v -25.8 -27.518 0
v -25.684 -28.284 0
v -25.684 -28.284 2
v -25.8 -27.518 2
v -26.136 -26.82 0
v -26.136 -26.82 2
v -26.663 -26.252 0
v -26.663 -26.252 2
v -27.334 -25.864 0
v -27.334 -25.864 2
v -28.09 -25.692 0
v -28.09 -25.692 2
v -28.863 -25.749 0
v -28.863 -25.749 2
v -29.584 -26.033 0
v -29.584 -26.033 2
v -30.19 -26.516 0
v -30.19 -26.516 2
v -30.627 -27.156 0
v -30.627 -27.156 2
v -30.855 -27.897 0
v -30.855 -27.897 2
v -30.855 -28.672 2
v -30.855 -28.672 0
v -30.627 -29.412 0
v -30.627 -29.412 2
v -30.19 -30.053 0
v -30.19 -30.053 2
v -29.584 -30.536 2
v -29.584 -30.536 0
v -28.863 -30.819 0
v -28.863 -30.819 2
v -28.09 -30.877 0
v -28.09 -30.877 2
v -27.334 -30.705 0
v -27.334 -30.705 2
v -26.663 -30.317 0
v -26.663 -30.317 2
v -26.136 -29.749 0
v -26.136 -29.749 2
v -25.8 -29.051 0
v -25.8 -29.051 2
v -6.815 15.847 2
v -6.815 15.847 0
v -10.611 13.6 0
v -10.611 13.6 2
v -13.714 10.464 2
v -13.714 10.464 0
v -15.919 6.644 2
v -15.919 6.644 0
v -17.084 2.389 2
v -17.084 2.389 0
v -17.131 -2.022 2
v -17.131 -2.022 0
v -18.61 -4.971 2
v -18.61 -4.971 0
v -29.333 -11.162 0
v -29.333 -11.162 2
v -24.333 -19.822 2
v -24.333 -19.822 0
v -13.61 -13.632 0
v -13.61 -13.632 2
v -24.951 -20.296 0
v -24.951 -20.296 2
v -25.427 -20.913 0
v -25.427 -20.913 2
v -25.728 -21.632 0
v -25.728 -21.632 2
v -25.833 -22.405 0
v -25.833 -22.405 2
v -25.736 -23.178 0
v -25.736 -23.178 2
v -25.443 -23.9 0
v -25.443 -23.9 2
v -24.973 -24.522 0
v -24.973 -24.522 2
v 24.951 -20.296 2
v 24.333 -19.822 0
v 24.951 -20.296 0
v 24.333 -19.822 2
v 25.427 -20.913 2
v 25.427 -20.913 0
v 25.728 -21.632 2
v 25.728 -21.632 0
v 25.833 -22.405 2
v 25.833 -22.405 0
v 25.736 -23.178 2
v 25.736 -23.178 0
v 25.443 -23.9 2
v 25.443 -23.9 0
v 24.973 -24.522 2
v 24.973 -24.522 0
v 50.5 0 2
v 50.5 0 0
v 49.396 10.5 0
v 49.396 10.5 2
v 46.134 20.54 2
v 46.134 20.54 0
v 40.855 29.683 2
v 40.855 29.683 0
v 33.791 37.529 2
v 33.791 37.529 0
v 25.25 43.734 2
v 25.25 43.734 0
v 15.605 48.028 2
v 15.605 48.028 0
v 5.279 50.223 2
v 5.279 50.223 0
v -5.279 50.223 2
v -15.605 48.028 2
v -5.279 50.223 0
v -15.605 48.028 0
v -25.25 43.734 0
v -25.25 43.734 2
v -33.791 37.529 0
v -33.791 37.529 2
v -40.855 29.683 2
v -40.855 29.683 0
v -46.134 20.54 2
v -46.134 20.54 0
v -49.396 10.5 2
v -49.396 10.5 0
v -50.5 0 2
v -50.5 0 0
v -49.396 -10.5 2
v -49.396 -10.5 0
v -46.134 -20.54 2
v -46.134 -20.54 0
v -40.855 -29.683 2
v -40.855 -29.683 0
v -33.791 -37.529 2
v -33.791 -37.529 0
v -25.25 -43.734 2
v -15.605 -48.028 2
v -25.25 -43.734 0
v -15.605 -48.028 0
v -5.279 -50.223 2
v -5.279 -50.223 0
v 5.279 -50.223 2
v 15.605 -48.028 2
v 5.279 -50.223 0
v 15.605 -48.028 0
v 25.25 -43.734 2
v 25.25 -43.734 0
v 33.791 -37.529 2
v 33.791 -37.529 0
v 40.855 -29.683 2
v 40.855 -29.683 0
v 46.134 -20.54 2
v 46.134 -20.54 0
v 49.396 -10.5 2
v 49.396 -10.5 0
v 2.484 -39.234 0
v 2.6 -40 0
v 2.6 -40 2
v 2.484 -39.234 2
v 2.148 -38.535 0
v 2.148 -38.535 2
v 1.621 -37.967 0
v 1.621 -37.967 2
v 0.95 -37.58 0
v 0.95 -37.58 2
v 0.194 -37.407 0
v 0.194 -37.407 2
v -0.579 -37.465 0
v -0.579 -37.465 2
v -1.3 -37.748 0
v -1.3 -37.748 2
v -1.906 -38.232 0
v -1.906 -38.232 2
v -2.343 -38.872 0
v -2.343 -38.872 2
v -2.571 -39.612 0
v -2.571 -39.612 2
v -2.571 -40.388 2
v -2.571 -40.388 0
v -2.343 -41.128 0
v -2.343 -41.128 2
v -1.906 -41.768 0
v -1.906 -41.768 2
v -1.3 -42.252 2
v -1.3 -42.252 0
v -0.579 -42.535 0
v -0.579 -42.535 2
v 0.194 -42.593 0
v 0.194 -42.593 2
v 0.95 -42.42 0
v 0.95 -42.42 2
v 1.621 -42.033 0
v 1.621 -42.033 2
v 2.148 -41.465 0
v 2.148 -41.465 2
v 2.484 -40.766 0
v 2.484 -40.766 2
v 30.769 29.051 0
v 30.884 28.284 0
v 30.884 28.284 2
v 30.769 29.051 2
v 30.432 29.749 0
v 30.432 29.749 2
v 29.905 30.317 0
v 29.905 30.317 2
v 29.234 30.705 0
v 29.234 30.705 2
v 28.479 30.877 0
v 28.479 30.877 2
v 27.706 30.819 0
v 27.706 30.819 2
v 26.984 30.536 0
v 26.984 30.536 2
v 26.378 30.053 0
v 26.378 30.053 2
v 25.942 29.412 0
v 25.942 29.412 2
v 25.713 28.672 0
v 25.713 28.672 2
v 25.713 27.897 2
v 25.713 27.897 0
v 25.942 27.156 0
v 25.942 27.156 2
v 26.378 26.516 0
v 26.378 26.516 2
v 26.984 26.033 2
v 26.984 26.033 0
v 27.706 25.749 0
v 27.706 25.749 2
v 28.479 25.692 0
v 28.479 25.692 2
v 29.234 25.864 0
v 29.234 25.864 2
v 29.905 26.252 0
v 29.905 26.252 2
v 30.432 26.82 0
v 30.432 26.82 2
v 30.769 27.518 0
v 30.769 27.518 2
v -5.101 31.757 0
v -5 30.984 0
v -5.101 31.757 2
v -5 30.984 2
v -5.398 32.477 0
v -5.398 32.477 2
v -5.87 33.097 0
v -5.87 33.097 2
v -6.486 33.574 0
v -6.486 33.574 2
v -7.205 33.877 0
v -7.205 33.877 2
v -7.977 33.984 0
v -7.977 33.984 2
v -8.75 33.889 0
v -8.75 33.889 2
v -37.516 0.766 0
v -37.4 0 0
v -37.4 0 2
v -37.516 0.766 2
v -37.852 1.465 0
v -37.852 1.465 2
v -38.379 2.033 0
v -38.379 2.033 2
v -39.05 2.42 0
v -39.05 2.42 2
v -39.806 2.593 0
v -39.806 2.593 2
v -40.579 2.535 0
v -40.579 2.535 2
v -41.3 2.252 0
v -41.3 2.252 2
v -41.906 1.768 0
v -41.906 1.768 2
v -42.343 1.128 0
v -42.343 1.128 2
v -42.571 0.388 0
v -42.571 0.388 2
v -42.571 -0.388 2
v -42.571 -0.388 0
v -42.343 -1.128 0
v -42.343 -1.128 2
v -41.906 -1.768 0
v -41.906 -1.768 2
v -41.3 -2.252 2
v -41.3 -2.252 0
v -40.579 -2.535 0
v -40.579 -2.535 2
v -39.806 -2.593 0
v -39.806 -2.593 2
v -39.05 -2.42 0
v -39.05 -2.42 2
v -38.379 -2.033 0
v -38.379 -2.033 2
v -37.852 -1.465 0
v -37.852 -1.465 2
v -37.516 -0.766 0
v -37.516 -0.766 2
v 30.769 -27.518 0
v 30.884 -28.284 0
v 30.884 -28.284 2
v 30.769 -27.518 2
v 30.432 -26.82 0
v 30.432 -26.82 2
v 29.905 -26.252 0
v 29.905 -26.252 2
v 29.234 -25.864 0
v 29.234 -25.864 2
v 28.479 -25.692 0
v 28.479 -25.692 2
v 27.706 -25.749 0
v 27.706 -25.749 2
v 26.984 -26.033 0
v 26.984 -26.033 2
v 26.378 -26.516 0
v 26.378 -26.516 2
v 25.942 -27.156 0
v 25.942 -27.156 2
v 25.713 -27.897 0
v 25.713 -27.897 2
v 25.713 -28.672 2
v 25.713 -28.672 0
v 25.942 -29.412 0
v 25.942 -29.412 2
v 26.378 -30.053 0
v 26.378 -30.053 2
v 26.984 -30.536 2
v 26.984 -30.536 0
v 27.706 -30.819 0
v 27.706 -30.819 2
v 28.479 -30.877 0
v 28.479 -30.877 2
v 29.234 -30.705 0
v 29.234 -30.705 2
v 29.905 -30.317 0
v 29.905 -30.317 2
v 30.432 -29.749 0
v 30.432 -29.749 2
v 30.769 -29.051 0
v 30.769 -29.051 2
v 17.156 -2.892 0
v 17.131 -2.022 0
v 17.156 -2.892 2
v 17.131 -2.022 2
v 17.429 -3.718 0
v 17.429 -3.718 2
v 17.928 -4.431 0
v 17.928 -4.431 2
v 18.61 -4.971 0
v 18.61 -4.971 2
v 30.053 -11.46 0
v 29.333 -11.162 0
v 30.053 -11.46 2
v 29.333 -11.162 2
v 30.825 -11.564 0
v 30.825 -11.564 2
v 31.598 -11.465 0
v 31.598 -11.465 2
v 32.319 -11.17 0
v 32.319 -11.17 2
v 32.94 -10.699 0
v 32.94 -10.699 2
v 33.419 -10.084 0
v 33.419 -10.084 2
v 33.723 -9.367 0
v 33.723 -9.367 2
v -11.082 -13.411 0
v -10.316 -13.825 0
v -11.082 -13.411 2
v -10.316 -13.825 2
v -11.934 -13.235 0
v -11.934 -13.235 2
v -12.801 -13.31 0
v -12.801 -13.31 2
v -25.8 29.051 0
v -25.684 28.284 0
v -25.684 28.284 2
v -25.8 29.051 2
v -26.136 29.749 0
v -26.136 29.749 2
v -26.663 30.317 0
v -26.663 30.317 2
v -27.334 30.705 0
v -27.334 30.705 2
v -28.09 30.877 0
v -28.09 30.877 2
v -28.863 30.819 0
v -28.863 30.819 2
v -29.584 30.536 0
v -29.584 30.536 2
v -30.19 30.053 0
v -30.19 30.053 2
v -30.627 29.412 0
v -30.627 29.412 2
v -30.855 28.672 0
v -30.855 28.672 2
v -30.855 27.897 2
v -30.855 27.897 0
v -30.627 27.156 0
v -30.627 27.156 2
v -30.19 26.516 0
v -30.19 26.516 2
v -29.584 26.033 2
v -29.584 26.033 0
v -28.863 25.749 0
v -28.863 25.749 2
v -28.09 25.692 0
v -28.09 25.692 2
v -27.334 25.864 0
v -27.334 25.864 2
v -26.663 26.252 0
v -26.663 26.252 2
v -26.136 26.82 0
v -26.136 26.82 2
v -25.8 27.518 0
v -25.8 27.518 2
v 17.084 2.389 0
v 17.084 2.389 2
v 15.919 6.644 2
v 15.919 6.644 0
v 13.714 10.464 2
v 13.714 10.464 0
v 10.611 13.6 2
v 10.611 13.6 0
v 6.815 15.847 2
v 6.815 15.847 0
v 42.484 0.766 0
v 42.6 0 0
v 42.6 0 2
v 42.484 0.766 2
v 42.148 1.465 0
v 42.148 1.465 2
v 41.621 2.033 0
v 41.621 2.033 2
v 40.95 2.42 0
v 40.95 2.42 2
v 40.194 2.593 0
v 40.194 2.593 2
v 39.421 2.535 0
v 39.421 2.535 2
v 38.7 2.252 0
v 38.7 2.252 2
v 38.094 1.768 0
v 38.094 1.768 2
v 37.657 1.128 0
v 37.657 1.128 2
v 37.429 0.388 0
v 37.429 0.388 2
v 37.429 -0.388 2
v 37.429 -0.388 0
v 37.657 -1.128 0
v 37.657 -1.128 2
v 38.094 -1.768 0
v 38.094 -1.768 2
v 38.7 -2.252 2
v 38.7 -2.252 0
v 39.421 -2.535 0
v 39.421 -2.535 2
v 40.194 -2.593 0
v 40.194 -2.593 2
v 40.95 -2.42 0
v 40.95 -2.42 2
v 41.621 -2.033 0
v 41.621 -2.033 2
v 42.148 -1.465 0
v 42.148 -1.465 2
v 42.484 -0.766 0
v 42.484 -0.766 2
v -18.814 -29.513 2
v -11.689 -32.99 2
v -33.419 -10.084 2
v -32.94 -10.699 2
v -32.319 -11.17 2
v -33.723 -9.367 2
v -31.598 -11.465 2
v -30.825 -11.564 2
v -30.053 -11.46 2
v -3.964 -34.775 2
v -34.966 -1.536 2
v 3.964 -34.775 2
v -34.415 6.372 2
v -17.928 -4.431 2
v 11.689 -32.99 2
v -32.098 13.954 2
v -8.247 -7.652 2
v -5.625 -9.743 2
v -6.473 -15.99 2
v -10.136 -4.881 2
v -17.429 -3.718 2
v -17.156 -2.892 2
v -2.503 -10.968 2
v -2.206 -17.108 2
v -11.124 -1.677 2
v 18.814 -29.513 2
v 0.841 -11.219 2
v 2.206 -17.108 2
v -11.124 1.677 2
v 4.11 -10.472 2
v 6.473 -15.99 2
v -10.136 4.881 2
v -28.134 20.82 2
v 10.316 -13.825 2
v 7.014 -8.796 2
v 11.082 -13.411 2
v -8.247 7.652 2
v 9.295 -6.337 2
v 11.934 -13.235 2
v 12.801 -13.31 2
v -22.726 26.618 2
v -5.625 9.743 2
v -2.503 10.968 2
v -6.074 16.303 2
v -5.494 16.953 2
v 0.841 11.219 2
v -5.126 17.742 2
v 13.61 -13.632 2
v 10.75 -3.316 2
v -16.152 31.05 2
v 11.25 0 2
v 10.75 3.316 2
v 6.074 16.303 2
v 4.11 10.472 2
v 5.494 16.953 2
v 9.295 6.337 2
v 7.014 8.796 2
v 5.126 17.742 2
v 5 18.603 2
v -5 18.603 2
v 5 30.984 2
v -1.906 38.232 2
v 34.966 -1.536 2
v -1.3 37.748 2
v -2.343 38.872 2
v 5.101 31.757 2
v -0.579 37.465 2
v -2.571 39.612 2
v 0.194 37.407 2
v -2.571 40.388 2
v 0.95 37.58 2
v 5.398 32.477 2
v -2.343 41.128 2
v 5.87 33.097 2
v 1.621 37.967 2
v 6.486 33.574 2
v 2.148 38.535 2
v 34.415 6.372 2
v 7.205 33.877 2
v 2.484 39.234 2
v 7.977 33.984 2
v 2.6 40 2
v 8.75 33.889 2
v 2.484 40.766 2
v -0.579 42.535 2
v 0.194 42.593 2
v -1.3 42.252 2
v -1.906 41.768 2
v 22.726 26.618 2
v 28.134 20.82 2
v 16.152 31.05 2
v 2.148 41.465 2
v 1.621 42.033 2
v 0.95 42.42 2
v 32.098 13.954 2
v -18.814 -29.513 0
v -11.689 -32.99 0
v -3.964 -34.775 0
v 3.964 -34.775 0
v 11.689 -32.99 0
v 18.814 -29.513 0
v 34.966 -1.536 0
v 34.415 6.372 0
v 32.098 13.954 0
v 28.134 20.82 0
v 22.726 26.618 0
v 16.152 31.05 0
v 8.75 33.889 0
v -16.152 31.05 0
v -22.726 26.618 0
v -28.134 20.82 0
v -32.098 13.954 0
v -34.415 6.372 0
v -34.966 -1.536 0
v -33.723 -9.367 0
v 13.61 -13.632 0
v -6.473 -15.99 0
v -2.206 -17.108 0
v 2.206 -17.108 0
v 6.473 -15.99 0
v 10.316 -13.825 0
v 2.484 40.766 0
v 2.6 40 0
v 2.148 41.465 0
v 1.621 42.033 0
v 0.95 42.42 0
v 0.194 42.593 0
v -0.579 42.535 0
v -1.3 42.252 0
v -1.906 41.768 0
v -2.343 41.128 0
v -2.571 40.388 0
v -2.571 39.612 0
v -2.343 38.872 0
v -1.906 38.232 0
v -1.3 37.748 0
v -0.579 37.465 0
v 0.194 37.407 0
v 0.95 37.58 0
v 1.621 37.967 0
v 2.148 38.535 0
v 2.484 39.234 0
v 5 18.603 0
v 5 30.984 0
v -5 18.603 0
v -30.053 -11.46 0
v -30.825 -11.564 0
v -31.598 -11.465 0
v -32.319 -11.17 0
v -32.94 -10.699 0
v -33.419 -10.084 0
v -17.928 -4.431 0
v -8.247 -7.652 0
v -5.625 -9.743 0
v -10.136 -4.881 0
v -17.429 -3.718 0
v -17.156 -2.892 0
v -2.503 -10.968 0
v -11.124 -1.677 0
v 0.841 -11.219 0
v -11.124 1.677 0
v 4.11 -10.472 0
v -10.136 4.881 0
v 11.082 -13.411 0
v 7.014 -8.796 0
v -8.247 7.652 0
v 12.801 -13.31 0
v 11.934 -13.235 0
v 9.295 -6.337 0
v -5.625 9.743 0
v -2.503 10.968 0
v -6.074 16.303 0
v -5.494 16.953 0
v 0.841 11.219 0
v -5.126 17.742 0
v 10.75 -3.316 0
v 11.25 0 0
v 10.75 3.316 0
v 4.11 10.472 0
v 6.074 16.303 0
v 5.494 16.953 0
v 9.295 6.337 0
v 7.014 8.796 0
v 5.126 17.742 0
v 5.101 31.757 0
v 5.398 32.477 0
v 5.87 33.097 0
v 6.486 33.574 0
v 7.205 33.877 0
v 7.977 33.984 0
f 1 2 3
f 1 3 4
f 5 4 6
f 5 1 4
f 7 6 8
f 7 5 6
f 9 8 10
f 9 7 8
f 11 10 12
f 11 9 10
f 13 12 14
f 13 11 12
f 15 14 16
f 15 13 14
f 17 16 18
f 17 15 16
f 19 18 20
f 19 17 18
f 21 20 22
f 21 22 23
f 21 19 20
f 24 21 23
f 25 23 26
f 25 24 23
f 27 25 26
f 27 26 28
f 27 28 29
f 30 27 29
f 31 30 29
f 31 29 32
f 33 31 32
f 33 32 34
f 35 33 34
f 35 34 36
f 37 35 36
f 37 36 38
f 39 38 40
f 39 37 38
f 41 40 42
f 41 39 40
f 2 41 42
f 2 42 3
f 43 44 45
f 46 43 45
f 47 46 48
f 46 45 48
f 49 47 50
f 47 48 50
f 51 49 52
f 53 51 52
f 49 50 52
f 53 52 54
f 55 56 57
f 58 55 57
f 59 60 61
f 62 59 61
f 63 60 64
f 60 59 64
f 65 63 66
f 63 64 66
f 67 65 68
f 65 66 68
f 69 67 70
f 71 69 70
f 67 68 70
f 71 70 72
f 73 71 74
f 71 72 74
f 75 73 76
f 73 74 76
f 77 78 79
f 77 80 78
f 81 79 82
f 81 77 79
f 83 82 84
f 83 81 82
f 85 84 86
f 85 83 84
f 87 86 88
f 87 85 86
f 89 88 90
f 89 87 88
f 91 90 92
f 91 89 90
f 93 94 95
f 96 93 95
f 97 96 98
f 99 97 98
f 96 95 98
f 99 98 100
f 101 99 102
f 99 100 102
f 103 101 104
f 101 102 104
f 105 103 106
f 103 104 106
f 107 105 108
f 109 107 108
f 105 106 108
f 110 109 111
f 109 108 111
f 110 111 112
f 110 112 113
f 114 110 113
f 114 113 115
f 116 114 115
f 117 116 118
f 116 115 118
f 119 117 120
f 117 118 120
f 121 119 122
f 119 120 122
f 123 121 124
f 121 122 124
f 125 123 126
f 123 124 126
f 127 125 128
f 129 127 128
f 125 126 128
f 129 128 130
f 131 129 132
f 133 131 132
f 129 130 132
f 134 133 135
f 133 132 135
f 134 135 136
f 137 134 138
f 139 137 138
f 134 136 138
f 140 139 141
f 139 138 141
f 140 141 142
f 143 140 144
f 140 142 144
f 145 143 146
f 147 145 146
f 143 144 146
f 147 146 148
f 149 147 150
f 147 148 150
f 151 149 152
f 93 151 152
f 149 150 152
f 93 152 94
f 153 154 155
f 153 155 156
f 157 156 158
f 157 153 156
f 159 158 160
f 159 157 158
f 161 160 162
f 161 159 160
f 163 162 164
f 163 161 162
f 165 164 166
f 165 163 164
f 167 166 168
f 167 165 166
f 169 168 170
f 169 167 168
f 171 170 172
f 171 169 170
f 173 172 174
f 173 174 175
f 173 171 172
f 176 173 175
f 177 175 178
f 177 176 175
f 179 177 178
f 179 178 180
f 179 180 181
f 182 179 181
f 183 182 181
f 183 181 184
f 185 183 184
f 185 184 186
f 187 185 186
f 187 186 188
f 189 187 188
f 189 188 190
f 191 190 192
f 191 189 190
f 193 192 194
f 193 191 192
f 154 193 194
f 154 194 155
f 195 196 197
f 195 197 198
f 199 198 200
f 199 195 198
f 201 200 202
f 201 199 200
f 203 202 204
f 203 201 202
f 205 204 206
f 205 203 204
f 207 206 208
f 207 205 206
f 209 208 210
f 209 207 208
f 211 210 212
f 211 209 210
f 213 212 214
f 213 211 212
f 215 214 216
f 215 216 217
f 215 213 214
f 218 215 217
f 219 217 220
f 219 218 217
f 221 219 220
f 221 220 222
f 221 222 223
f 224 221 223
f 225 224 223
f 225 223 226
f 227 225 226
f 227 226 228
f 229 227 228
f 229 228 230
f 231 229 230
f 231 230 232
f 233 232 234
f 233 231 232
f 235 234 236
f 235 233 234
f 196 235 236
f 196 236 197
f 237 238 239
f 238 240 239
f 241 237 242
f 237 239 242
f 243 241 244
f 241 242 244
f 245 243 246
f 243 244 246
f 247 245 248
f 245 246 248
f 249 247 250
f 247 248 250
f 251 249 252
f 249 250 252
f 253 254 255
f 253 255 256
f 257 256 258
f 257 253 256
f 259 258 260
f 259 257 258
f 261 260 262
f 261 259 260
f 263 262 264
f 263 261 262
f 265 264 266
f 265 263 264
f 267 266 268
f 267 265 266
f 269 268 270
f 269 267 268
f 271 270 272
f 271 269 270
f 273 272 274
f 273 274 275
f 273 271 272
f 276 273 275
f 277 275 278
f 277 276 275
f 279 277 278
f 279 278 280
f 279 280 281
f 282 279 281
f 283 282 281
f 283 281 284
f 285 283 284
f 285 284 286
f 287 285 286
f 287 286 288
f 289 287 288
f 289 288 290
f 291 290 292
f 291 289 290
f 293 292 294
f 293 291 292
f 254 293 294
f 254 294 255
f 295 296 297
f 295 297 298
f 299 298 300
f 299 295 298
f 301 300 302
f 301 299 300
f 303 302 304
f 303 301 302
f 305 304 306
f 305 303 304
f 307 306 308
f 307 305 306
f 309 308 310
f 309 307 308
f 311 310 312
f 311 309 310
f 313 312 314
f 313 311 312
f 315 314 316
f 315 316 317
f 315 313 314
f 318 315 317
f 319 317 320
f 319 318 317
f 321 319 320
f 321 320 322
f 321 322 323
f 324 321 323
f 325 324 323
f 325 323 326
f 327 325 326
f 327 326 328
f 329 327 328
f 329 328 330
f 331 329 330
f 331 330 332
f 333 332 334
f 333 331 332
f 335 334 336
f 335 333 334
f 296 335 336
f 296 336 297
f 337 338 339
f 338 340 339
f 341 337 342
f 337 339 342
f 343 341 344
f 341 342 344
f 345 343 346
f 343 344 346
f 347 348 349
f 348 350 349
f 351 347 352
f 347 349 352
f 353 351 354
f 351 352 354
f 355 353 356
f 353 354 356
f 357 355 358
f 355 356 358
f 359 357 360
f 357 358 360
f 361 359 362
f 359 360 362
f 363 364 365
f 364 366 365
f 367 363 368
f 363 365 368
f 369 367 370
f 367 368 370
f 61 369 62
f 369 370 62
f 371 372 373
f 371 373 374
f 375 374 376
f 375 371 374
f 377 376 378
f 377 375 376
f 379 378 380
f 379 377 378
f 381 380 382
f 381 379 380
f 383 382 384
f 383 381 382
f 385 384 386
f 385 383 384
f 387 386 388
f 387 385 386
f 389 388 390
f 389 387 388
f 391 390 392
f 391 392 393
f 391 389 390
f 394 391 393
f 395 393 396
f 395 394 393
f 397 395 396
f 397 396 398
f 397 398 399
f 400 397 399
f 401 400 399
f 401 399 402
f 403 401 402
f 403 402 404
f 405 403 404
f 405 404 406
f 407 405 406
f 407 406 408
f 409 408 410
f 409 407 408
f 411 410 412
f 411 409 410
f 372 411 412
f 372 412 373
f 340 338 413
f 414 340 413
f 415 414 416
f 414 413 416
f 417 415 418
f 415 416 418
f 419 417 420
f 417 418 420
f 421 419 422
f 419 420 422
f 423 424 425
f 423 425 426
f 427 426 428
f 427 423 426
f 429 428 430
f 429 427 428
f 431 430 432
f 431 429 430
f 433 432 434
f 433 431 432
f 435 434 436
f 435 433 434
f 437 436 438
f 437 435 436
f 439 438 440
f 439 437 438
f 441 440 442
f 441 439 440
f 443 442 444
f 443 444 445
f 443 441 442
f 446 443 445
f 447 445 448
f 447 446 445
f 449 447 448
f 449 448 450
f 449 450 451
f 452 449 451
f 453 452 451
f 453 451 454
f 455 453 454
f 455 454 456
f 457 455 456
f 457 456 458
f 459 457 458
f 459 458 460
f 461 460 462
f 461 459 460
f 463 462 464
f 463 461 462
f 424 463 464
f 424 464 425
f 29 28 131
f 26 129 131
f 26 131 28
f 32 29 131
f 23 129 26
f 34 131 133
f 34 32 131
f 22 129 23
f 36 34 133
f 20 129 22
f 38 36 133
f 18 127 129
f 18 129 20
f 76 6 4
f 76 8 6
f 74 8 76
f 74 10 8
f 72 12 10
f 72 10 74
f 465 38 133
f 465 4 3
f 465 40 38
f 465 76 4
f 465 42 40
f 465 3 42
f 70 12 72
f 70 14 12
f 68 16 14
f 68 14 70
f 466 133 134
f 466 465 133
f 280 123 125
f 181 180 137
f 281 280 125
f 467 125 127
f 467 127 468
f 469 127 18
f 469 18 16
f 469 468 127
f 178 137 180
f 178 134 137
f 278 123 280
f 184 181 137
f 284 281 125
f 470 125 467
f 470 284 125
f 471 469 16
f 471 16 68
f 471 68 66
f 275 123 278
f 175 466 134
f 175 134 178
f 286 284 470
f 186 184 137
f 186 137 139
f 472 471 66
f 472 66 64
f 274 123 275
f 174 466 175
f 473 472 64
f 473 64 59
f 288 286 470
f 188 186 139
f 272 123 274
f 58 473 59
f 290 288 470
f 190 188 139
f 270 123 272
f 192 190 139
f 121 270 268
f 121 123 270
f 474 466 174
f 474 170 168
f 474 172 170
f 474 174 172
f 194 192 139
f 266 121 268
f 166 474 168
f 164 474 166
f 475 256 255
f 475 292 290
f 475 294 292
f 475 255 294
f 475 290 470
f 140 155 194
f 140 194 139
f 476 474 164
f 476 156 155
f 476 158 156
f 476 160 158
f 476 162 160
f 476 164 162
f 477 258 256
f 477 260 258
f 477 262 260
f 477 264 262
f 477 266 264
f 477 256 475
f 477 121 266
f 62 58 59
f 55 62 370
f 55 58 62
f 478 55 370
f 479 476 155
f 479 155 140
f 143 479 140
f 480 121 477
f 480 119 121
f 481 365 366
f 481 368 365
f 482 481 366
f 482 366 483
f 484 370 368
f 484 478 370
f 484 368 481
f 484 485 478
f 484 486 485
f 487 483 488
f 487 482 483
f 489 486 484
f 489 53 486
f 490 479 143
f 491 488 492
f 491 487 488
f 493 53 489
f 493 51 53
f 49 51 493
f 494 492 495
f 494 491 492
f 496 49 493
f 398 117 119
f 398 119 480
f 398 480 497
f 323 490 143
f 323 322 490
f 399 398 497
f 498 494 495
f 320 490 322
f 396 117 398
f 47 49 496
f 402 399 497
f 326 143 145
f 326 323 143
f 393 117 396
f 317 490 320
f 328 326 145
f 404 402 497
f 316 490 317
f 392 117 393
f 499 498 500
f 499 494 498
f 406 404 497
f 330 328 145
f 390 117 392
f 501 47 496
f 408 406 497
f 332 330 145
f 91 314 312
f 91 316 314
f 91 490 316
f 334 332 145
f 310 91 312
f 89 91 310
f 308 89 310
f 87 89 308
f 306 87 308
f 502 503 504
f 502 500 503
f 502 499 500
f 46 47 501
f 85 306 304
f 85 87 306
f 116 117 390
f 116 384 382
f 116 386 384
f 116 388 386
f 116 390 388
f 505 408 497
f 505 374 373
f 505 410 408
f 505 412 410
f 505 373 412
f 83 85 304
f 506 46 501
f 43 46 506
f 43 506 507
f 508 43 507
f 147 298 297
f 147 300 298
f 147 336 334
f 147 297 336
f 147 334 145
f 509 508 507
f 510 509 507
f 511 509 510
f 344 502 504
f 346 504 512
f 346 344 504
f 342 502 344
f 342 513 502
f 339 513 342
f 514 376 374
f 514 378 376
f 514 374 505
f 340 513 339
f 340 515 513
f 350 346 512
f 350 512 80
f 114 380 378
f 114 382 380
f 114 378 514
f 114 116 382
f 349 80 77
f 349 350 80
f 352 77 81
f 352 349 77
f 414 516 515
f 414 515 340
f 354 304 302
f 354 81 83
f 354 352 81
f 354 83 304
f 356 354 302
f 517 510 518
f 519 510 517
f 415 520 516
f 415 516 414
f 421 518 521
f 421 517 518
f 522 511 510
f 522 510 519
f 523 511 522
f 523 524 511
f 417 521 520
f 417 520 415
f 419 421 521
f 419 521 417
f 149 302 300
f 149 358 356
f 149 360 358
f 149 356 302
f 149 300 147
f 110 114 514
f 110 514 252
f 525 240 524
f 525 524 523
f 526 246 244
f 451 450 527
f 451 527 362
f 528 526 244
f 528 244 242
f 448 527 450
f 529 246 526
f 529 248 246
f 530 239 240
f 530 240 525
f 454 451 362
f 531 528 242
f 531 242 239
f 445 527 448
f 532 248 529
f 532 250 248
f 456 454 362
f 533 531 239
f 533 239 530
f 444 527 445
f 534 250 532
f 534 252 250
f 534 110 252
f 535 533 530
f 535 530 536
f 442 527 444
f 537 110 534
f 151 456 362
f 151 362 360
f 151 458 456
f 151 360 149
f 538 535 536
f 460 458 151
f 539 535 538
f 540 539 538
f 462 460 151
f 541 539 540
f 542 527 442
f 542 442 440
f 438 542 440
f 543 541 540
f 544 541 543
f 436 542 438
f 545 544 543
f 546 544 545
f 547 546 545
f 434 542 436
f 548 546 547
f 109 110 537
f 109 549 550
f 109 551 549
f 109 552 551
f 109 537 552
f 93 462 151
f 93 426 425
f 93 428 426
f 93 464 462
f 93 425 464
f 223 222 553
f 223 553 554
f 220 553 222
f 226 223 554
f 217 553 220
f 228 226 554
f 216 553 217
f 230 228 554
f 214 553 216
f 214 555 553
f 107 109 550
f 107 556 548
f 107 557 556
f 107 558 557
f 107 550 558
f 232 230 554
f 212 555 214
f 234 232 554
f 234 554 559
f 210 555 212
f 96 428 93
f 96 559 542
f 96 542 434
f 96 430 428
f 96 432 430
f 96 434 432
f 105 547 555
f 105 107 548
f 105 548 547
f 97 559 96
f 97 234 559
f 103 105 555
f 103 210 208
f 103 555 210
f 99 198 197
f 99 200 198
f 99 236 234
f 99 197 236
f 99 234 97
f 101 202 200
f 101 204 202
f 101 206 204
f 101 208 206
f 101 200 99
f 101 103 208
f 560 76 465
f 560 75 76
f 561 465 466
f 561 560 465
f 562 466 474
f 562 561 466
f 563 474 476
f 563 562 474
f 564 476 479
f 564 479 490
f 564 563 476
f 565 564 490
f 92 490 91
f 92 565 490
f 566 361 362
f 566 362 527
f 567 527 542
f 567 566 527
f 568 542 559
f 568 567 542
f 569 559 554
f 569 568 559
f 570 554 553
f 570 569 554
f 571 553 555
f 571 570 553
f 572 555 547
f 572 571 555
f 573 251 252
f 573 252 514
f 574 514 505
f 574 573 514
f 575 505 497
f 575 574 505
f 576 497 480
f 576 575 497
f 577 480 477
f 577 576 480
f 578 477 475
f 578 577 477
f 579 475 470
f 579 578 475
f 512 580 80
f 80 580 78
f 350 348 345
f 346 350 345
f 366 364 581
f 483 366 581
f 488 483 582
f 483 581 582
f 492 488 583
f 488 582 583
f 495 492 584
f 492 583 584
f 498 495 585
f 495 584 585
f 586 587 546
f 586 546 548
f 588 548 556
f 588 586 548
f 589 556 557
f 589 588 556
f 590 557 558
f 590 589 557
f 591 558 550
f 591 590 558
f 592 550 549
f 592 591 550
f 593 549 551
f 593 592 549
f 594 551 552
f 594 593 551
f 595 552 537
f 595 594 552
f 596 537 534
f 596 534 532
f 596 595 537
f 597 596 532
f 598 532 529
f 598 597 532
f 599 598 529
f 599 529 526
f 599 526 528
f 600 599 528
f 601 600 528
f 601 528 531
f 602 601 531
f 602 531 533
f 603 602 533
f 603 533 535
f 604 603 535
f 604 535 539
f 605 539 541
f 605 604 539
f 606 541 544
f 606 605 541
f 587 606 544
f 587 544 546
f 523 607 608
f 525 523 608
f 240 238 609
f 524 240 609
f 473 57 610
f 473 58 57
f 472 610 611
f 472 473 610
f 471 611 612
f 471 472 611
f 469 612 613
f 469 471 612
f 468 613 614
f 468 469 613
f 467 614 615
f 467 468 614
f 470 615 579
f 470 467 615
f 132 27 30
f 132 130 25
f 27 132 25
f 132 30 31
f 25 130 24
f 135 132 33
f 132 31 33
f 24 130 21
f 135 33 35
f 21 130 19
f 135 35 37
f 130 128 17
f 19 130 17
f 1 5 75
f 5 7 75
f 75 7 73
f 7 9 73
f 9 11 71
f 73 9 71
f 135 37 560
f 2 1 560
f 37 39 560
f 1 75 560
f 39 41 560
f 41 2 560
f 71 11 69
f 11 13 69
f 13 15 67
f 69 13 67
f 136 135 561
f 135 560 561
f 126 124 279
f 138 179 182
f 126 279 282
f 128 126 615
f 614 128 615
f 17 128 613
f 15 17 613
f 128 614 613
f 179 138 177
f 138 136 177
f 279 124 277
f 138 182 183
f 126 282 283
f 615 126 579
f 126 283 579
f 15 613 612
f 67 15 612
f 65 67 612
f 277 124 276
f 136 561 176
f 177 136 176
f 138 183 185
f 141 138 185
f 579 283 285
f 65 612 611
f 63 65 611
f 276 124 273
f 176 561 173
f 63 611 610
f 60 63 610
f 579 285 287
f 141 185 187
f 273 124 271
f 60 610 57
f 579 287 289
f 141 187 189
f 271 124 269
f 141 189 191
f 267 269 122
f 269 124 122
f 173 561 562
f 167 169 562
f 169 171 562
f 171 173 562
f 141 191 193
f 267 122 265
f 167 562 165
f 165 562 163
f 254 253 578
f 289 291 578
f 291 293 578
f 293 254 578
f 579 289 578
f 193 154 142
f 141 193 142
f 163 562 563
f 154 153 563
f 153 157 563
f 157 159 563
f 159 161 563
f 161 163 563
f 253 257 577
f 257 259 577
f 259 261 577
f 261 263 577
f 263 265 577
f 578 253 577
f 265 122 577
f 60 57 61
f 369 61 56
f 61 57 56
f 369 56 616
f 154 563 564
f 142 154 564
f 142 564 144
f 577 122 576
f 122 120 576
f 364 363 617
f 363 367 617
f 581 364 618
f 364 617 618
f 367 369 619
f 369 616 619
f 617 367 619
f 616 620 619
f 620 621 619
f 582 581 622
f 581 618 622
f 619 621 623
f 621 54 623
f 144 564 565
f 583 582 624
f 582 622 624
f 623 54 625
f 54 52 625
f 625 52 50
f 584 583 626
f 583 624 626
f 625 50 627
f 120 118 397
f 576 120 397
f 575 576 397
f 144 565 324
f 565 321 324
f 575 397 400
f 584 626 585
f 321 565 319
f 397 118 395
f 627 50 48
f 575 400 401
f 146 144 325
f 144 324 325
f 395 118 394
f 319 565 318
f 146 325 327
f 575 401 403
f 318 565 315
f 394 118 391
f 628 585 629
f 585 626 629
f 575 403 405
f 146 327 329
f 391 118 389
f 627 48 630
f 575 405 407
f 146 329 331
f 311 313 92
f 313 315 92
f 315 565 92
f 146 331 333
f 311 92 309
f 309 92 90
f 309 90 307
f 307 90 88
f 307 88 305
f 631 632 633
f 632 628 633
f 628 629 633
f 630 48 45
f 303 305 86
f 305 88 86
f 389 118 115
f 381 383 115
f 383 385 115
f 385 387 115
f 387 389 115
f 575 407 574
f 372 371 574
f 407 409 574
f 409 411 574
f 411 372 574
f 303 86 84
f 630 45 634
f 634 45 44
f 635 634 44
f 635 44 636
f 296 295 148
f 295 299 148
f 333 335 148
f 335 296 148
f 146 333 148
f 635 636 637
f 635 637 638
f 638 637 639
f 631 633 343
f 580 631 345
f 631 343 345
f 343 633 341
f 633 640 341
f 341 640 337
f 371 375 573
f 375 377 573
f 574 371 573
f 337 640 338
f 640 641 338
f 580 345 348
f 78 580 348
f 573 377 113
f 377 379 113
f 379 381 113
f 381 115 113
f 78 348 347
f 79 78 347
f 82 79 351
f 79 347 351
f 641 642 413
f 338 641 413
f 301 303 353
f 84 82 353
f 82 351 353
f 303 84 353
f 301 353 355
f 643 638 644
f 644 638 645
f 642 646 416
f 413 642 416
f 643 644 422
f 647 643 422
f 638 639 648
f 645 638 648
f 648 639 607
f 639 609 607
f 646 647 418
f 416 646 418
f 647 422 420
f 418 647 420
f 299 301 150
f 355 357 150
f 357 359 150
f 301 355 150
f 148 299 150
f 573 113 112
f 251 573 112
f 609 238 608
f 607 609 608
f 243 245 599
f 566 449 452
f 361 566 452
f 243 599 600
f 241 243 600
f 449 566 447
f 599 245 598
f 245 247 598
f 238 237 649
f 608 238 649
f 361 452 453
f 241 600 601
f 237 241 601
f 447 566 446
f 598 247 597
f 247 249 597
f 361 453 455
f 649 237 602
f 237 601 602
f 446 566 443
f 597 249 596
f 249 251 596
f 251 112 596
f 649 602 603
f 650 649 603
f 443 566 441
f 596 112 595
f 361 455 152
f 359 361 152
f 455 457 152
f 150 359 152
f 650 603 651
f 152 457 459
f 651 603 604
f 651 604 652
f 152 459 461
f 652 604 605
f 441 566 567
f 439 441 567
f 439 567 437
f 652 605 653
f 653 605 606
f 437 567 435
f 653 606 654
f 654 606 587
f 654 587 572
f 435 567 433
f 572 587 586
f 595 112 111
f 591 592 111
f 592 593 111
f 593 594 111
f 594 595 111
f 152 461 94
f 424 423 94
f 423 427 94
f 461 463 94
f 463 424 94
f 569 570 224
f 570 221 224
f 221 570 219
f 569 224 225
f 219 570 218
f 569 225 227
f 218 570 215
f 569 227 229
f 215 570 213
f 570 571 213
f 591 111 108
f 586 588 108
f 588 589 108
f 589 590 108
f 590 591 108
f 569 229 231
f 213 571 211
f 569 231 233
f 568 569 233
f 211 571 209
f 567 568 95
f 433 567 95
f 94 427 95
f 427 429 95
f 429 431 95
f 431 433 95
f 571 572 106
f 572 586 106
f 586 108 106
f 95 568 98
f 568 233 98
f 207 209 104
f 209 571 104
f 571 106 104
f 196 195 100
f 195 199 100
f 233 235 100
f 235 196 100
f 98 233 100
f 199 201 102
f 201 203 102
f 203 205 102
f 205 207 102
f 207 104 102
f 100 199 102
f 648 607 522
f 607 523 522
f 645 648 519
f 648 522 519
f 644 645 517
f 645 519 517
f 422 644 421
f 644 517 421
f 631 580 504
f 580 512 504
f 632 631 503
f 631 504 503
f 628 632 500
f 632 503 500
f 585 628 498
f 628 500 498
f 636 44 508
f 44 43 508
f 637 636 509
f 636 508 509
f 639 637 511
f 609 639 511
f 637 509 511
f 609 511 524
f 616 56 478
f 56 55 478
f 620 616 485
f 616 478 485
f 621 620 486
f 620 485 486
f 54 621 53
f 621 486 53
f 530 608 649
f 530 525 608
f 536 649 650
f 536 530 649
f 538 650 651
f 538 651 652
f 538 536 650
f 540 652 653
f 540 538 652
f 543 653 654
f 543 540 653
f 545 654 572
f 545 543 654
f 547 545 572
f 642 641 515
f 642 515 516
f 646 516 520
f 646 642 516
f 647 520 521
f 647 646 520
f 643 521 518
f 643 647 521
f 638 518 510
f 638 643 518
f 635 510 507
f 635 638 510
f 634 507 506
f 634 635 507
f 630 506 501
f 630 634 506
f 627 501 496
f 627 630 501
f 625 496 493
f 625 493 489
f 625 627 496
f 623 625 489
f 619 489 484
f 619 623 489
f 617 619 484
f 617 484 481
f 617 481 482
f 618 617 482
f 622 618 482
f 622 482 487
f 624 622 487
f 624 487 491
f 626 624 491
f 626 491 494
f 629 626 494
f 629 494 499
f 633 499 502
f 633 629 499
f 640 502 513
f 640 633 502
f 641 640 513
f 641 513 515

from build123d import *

# Parameters (mm, degrees)
SKETCH_1_R      = 50.5
SKETCH_1_R_2    = 2.6
SKETCH_1_R_3    = 35
EXTRUDE_1_DEPTH = 2
EXTRUDE_START   = -2
SKETCH_2_R      = 11.25
EXTRUDE_3_DEPTH = 2
FILLET_1_R      = 3


with BuildPart() as part:
    # 草图1 → 凸台-拉伸1 (new body)
    with BuildSketch(Plane.XY):
        Circle(SKETCH_1_R)
        with Locations((0, 40)):
            Circle(SKETCH_1_R_2, mode=Mode.SUBTRACT)
        Circle(SKETCH_1_R_3, mode=Mode.SUBTRACT)
        with Locations((28.284271247, 28.284271247)):
            Circle(SKETCH_1_R_2, mode=Mode.SUBTRACT)
        with Locations((40, 0)):
            Circle(SKETCH_1_R_2, mode=Mode.SUBTRACT)
        with Locations((28.284271247, -28.284271247)):
            Circle(SKETCH_1_R_2, mode=Mode.SUBTRACT)
        with Locations((0, -40)):
            Circle(SKETCH_1_R_2, mode=Mode.SUBTRACT)
        with Locations((-28.284271247, -28.284271247)):
            Circle(SKETCH_1_R_2, mode=Mode.SUBTRACT)
        with Locations((-40, 0)):
            Circle(SKETCH_1_R_2, mode=Mode.SUBTRACT)
        with Locations((-28.284271247, 28.284271247)):
            Circle(SKETCH_1_R_2, mode=Mode.SUBTRACT)
    extrude(amount=EXTRUDE_1_DEPTH)

    # 草图2 → 凸台-拉伸3 (add)
    with BuildSketch(Plane.XY.offset(2).offset(EXTRUDE_START)):
        with BuildLine():
            ThreePointArc((5, 34.641016151), (0, 35), (-5, 34.641016151))
            Line((-5, 34.641016151), (-5, 16.509466981))
            ThreePointArc((-5, 16.509466981), (-14.938938215, 8.625), (-16.797617809, -3.924606472))
            Line((-16.797617809, -3.924606472), (-32.5, -12.990381057))
            ThreePointArc((-32.5, -12.990381057), (-30.310889132, -17.5), (-27.5, -21.650635095))
            Line((-27.5, -21.650635095), (-11.797617809, -12.584860509))
            ThreePointArc((-11.797617809, -12.584860509), (0, -17.25), (11.797617809, -12.584860509))
            Line((11.797617809, -12.584860509), (27.5, -21.650635095))
            ThreePointArc((27.5, -21.650635095), (30.310889132, -17.5), (32.5, -12.990381057))
            Line((32.5, -12.990381057), (16.797617809, -3.924606472))
            ThreePointArc((16.797617809, -3.924606472), (14.938938215, 8.625), (5, 16.509466981))
            Line((5, 16.509466981), (5, 34.641016151))
        make_face()
        Circle(SKETCH_2_R, mode=Mode.SUBTRACT)
    extrude(amount=EXTRUDE_3_DEPTH)

    # 圆角1
    fillet_1_edges = [part.edges().sort_by_distance(p)[0] for p in [
        (-16.797617809, -3.924606472, 1),
        (-32.5, -12.990381057, 1),
        (-27.5, -21.650635095, 1),
        (-11.797617809, -12.584860509, 1),
        (11.797617809, -12.584860509, 1),
        (27.5, -21.650635095, 1),
        (32.5, -12.990381057, 1),
        (16.797617809, -3.924606472, 1),
        (5, 16.509466981, 1),
        (5, 34.641016151, 1),
        (-5, 34.641016151, 1),
        (-5, 16.509466981, 1),
    ]]
    fillet(fillet_1_edges, radius=FILLET_1_R)


solid = part.part
